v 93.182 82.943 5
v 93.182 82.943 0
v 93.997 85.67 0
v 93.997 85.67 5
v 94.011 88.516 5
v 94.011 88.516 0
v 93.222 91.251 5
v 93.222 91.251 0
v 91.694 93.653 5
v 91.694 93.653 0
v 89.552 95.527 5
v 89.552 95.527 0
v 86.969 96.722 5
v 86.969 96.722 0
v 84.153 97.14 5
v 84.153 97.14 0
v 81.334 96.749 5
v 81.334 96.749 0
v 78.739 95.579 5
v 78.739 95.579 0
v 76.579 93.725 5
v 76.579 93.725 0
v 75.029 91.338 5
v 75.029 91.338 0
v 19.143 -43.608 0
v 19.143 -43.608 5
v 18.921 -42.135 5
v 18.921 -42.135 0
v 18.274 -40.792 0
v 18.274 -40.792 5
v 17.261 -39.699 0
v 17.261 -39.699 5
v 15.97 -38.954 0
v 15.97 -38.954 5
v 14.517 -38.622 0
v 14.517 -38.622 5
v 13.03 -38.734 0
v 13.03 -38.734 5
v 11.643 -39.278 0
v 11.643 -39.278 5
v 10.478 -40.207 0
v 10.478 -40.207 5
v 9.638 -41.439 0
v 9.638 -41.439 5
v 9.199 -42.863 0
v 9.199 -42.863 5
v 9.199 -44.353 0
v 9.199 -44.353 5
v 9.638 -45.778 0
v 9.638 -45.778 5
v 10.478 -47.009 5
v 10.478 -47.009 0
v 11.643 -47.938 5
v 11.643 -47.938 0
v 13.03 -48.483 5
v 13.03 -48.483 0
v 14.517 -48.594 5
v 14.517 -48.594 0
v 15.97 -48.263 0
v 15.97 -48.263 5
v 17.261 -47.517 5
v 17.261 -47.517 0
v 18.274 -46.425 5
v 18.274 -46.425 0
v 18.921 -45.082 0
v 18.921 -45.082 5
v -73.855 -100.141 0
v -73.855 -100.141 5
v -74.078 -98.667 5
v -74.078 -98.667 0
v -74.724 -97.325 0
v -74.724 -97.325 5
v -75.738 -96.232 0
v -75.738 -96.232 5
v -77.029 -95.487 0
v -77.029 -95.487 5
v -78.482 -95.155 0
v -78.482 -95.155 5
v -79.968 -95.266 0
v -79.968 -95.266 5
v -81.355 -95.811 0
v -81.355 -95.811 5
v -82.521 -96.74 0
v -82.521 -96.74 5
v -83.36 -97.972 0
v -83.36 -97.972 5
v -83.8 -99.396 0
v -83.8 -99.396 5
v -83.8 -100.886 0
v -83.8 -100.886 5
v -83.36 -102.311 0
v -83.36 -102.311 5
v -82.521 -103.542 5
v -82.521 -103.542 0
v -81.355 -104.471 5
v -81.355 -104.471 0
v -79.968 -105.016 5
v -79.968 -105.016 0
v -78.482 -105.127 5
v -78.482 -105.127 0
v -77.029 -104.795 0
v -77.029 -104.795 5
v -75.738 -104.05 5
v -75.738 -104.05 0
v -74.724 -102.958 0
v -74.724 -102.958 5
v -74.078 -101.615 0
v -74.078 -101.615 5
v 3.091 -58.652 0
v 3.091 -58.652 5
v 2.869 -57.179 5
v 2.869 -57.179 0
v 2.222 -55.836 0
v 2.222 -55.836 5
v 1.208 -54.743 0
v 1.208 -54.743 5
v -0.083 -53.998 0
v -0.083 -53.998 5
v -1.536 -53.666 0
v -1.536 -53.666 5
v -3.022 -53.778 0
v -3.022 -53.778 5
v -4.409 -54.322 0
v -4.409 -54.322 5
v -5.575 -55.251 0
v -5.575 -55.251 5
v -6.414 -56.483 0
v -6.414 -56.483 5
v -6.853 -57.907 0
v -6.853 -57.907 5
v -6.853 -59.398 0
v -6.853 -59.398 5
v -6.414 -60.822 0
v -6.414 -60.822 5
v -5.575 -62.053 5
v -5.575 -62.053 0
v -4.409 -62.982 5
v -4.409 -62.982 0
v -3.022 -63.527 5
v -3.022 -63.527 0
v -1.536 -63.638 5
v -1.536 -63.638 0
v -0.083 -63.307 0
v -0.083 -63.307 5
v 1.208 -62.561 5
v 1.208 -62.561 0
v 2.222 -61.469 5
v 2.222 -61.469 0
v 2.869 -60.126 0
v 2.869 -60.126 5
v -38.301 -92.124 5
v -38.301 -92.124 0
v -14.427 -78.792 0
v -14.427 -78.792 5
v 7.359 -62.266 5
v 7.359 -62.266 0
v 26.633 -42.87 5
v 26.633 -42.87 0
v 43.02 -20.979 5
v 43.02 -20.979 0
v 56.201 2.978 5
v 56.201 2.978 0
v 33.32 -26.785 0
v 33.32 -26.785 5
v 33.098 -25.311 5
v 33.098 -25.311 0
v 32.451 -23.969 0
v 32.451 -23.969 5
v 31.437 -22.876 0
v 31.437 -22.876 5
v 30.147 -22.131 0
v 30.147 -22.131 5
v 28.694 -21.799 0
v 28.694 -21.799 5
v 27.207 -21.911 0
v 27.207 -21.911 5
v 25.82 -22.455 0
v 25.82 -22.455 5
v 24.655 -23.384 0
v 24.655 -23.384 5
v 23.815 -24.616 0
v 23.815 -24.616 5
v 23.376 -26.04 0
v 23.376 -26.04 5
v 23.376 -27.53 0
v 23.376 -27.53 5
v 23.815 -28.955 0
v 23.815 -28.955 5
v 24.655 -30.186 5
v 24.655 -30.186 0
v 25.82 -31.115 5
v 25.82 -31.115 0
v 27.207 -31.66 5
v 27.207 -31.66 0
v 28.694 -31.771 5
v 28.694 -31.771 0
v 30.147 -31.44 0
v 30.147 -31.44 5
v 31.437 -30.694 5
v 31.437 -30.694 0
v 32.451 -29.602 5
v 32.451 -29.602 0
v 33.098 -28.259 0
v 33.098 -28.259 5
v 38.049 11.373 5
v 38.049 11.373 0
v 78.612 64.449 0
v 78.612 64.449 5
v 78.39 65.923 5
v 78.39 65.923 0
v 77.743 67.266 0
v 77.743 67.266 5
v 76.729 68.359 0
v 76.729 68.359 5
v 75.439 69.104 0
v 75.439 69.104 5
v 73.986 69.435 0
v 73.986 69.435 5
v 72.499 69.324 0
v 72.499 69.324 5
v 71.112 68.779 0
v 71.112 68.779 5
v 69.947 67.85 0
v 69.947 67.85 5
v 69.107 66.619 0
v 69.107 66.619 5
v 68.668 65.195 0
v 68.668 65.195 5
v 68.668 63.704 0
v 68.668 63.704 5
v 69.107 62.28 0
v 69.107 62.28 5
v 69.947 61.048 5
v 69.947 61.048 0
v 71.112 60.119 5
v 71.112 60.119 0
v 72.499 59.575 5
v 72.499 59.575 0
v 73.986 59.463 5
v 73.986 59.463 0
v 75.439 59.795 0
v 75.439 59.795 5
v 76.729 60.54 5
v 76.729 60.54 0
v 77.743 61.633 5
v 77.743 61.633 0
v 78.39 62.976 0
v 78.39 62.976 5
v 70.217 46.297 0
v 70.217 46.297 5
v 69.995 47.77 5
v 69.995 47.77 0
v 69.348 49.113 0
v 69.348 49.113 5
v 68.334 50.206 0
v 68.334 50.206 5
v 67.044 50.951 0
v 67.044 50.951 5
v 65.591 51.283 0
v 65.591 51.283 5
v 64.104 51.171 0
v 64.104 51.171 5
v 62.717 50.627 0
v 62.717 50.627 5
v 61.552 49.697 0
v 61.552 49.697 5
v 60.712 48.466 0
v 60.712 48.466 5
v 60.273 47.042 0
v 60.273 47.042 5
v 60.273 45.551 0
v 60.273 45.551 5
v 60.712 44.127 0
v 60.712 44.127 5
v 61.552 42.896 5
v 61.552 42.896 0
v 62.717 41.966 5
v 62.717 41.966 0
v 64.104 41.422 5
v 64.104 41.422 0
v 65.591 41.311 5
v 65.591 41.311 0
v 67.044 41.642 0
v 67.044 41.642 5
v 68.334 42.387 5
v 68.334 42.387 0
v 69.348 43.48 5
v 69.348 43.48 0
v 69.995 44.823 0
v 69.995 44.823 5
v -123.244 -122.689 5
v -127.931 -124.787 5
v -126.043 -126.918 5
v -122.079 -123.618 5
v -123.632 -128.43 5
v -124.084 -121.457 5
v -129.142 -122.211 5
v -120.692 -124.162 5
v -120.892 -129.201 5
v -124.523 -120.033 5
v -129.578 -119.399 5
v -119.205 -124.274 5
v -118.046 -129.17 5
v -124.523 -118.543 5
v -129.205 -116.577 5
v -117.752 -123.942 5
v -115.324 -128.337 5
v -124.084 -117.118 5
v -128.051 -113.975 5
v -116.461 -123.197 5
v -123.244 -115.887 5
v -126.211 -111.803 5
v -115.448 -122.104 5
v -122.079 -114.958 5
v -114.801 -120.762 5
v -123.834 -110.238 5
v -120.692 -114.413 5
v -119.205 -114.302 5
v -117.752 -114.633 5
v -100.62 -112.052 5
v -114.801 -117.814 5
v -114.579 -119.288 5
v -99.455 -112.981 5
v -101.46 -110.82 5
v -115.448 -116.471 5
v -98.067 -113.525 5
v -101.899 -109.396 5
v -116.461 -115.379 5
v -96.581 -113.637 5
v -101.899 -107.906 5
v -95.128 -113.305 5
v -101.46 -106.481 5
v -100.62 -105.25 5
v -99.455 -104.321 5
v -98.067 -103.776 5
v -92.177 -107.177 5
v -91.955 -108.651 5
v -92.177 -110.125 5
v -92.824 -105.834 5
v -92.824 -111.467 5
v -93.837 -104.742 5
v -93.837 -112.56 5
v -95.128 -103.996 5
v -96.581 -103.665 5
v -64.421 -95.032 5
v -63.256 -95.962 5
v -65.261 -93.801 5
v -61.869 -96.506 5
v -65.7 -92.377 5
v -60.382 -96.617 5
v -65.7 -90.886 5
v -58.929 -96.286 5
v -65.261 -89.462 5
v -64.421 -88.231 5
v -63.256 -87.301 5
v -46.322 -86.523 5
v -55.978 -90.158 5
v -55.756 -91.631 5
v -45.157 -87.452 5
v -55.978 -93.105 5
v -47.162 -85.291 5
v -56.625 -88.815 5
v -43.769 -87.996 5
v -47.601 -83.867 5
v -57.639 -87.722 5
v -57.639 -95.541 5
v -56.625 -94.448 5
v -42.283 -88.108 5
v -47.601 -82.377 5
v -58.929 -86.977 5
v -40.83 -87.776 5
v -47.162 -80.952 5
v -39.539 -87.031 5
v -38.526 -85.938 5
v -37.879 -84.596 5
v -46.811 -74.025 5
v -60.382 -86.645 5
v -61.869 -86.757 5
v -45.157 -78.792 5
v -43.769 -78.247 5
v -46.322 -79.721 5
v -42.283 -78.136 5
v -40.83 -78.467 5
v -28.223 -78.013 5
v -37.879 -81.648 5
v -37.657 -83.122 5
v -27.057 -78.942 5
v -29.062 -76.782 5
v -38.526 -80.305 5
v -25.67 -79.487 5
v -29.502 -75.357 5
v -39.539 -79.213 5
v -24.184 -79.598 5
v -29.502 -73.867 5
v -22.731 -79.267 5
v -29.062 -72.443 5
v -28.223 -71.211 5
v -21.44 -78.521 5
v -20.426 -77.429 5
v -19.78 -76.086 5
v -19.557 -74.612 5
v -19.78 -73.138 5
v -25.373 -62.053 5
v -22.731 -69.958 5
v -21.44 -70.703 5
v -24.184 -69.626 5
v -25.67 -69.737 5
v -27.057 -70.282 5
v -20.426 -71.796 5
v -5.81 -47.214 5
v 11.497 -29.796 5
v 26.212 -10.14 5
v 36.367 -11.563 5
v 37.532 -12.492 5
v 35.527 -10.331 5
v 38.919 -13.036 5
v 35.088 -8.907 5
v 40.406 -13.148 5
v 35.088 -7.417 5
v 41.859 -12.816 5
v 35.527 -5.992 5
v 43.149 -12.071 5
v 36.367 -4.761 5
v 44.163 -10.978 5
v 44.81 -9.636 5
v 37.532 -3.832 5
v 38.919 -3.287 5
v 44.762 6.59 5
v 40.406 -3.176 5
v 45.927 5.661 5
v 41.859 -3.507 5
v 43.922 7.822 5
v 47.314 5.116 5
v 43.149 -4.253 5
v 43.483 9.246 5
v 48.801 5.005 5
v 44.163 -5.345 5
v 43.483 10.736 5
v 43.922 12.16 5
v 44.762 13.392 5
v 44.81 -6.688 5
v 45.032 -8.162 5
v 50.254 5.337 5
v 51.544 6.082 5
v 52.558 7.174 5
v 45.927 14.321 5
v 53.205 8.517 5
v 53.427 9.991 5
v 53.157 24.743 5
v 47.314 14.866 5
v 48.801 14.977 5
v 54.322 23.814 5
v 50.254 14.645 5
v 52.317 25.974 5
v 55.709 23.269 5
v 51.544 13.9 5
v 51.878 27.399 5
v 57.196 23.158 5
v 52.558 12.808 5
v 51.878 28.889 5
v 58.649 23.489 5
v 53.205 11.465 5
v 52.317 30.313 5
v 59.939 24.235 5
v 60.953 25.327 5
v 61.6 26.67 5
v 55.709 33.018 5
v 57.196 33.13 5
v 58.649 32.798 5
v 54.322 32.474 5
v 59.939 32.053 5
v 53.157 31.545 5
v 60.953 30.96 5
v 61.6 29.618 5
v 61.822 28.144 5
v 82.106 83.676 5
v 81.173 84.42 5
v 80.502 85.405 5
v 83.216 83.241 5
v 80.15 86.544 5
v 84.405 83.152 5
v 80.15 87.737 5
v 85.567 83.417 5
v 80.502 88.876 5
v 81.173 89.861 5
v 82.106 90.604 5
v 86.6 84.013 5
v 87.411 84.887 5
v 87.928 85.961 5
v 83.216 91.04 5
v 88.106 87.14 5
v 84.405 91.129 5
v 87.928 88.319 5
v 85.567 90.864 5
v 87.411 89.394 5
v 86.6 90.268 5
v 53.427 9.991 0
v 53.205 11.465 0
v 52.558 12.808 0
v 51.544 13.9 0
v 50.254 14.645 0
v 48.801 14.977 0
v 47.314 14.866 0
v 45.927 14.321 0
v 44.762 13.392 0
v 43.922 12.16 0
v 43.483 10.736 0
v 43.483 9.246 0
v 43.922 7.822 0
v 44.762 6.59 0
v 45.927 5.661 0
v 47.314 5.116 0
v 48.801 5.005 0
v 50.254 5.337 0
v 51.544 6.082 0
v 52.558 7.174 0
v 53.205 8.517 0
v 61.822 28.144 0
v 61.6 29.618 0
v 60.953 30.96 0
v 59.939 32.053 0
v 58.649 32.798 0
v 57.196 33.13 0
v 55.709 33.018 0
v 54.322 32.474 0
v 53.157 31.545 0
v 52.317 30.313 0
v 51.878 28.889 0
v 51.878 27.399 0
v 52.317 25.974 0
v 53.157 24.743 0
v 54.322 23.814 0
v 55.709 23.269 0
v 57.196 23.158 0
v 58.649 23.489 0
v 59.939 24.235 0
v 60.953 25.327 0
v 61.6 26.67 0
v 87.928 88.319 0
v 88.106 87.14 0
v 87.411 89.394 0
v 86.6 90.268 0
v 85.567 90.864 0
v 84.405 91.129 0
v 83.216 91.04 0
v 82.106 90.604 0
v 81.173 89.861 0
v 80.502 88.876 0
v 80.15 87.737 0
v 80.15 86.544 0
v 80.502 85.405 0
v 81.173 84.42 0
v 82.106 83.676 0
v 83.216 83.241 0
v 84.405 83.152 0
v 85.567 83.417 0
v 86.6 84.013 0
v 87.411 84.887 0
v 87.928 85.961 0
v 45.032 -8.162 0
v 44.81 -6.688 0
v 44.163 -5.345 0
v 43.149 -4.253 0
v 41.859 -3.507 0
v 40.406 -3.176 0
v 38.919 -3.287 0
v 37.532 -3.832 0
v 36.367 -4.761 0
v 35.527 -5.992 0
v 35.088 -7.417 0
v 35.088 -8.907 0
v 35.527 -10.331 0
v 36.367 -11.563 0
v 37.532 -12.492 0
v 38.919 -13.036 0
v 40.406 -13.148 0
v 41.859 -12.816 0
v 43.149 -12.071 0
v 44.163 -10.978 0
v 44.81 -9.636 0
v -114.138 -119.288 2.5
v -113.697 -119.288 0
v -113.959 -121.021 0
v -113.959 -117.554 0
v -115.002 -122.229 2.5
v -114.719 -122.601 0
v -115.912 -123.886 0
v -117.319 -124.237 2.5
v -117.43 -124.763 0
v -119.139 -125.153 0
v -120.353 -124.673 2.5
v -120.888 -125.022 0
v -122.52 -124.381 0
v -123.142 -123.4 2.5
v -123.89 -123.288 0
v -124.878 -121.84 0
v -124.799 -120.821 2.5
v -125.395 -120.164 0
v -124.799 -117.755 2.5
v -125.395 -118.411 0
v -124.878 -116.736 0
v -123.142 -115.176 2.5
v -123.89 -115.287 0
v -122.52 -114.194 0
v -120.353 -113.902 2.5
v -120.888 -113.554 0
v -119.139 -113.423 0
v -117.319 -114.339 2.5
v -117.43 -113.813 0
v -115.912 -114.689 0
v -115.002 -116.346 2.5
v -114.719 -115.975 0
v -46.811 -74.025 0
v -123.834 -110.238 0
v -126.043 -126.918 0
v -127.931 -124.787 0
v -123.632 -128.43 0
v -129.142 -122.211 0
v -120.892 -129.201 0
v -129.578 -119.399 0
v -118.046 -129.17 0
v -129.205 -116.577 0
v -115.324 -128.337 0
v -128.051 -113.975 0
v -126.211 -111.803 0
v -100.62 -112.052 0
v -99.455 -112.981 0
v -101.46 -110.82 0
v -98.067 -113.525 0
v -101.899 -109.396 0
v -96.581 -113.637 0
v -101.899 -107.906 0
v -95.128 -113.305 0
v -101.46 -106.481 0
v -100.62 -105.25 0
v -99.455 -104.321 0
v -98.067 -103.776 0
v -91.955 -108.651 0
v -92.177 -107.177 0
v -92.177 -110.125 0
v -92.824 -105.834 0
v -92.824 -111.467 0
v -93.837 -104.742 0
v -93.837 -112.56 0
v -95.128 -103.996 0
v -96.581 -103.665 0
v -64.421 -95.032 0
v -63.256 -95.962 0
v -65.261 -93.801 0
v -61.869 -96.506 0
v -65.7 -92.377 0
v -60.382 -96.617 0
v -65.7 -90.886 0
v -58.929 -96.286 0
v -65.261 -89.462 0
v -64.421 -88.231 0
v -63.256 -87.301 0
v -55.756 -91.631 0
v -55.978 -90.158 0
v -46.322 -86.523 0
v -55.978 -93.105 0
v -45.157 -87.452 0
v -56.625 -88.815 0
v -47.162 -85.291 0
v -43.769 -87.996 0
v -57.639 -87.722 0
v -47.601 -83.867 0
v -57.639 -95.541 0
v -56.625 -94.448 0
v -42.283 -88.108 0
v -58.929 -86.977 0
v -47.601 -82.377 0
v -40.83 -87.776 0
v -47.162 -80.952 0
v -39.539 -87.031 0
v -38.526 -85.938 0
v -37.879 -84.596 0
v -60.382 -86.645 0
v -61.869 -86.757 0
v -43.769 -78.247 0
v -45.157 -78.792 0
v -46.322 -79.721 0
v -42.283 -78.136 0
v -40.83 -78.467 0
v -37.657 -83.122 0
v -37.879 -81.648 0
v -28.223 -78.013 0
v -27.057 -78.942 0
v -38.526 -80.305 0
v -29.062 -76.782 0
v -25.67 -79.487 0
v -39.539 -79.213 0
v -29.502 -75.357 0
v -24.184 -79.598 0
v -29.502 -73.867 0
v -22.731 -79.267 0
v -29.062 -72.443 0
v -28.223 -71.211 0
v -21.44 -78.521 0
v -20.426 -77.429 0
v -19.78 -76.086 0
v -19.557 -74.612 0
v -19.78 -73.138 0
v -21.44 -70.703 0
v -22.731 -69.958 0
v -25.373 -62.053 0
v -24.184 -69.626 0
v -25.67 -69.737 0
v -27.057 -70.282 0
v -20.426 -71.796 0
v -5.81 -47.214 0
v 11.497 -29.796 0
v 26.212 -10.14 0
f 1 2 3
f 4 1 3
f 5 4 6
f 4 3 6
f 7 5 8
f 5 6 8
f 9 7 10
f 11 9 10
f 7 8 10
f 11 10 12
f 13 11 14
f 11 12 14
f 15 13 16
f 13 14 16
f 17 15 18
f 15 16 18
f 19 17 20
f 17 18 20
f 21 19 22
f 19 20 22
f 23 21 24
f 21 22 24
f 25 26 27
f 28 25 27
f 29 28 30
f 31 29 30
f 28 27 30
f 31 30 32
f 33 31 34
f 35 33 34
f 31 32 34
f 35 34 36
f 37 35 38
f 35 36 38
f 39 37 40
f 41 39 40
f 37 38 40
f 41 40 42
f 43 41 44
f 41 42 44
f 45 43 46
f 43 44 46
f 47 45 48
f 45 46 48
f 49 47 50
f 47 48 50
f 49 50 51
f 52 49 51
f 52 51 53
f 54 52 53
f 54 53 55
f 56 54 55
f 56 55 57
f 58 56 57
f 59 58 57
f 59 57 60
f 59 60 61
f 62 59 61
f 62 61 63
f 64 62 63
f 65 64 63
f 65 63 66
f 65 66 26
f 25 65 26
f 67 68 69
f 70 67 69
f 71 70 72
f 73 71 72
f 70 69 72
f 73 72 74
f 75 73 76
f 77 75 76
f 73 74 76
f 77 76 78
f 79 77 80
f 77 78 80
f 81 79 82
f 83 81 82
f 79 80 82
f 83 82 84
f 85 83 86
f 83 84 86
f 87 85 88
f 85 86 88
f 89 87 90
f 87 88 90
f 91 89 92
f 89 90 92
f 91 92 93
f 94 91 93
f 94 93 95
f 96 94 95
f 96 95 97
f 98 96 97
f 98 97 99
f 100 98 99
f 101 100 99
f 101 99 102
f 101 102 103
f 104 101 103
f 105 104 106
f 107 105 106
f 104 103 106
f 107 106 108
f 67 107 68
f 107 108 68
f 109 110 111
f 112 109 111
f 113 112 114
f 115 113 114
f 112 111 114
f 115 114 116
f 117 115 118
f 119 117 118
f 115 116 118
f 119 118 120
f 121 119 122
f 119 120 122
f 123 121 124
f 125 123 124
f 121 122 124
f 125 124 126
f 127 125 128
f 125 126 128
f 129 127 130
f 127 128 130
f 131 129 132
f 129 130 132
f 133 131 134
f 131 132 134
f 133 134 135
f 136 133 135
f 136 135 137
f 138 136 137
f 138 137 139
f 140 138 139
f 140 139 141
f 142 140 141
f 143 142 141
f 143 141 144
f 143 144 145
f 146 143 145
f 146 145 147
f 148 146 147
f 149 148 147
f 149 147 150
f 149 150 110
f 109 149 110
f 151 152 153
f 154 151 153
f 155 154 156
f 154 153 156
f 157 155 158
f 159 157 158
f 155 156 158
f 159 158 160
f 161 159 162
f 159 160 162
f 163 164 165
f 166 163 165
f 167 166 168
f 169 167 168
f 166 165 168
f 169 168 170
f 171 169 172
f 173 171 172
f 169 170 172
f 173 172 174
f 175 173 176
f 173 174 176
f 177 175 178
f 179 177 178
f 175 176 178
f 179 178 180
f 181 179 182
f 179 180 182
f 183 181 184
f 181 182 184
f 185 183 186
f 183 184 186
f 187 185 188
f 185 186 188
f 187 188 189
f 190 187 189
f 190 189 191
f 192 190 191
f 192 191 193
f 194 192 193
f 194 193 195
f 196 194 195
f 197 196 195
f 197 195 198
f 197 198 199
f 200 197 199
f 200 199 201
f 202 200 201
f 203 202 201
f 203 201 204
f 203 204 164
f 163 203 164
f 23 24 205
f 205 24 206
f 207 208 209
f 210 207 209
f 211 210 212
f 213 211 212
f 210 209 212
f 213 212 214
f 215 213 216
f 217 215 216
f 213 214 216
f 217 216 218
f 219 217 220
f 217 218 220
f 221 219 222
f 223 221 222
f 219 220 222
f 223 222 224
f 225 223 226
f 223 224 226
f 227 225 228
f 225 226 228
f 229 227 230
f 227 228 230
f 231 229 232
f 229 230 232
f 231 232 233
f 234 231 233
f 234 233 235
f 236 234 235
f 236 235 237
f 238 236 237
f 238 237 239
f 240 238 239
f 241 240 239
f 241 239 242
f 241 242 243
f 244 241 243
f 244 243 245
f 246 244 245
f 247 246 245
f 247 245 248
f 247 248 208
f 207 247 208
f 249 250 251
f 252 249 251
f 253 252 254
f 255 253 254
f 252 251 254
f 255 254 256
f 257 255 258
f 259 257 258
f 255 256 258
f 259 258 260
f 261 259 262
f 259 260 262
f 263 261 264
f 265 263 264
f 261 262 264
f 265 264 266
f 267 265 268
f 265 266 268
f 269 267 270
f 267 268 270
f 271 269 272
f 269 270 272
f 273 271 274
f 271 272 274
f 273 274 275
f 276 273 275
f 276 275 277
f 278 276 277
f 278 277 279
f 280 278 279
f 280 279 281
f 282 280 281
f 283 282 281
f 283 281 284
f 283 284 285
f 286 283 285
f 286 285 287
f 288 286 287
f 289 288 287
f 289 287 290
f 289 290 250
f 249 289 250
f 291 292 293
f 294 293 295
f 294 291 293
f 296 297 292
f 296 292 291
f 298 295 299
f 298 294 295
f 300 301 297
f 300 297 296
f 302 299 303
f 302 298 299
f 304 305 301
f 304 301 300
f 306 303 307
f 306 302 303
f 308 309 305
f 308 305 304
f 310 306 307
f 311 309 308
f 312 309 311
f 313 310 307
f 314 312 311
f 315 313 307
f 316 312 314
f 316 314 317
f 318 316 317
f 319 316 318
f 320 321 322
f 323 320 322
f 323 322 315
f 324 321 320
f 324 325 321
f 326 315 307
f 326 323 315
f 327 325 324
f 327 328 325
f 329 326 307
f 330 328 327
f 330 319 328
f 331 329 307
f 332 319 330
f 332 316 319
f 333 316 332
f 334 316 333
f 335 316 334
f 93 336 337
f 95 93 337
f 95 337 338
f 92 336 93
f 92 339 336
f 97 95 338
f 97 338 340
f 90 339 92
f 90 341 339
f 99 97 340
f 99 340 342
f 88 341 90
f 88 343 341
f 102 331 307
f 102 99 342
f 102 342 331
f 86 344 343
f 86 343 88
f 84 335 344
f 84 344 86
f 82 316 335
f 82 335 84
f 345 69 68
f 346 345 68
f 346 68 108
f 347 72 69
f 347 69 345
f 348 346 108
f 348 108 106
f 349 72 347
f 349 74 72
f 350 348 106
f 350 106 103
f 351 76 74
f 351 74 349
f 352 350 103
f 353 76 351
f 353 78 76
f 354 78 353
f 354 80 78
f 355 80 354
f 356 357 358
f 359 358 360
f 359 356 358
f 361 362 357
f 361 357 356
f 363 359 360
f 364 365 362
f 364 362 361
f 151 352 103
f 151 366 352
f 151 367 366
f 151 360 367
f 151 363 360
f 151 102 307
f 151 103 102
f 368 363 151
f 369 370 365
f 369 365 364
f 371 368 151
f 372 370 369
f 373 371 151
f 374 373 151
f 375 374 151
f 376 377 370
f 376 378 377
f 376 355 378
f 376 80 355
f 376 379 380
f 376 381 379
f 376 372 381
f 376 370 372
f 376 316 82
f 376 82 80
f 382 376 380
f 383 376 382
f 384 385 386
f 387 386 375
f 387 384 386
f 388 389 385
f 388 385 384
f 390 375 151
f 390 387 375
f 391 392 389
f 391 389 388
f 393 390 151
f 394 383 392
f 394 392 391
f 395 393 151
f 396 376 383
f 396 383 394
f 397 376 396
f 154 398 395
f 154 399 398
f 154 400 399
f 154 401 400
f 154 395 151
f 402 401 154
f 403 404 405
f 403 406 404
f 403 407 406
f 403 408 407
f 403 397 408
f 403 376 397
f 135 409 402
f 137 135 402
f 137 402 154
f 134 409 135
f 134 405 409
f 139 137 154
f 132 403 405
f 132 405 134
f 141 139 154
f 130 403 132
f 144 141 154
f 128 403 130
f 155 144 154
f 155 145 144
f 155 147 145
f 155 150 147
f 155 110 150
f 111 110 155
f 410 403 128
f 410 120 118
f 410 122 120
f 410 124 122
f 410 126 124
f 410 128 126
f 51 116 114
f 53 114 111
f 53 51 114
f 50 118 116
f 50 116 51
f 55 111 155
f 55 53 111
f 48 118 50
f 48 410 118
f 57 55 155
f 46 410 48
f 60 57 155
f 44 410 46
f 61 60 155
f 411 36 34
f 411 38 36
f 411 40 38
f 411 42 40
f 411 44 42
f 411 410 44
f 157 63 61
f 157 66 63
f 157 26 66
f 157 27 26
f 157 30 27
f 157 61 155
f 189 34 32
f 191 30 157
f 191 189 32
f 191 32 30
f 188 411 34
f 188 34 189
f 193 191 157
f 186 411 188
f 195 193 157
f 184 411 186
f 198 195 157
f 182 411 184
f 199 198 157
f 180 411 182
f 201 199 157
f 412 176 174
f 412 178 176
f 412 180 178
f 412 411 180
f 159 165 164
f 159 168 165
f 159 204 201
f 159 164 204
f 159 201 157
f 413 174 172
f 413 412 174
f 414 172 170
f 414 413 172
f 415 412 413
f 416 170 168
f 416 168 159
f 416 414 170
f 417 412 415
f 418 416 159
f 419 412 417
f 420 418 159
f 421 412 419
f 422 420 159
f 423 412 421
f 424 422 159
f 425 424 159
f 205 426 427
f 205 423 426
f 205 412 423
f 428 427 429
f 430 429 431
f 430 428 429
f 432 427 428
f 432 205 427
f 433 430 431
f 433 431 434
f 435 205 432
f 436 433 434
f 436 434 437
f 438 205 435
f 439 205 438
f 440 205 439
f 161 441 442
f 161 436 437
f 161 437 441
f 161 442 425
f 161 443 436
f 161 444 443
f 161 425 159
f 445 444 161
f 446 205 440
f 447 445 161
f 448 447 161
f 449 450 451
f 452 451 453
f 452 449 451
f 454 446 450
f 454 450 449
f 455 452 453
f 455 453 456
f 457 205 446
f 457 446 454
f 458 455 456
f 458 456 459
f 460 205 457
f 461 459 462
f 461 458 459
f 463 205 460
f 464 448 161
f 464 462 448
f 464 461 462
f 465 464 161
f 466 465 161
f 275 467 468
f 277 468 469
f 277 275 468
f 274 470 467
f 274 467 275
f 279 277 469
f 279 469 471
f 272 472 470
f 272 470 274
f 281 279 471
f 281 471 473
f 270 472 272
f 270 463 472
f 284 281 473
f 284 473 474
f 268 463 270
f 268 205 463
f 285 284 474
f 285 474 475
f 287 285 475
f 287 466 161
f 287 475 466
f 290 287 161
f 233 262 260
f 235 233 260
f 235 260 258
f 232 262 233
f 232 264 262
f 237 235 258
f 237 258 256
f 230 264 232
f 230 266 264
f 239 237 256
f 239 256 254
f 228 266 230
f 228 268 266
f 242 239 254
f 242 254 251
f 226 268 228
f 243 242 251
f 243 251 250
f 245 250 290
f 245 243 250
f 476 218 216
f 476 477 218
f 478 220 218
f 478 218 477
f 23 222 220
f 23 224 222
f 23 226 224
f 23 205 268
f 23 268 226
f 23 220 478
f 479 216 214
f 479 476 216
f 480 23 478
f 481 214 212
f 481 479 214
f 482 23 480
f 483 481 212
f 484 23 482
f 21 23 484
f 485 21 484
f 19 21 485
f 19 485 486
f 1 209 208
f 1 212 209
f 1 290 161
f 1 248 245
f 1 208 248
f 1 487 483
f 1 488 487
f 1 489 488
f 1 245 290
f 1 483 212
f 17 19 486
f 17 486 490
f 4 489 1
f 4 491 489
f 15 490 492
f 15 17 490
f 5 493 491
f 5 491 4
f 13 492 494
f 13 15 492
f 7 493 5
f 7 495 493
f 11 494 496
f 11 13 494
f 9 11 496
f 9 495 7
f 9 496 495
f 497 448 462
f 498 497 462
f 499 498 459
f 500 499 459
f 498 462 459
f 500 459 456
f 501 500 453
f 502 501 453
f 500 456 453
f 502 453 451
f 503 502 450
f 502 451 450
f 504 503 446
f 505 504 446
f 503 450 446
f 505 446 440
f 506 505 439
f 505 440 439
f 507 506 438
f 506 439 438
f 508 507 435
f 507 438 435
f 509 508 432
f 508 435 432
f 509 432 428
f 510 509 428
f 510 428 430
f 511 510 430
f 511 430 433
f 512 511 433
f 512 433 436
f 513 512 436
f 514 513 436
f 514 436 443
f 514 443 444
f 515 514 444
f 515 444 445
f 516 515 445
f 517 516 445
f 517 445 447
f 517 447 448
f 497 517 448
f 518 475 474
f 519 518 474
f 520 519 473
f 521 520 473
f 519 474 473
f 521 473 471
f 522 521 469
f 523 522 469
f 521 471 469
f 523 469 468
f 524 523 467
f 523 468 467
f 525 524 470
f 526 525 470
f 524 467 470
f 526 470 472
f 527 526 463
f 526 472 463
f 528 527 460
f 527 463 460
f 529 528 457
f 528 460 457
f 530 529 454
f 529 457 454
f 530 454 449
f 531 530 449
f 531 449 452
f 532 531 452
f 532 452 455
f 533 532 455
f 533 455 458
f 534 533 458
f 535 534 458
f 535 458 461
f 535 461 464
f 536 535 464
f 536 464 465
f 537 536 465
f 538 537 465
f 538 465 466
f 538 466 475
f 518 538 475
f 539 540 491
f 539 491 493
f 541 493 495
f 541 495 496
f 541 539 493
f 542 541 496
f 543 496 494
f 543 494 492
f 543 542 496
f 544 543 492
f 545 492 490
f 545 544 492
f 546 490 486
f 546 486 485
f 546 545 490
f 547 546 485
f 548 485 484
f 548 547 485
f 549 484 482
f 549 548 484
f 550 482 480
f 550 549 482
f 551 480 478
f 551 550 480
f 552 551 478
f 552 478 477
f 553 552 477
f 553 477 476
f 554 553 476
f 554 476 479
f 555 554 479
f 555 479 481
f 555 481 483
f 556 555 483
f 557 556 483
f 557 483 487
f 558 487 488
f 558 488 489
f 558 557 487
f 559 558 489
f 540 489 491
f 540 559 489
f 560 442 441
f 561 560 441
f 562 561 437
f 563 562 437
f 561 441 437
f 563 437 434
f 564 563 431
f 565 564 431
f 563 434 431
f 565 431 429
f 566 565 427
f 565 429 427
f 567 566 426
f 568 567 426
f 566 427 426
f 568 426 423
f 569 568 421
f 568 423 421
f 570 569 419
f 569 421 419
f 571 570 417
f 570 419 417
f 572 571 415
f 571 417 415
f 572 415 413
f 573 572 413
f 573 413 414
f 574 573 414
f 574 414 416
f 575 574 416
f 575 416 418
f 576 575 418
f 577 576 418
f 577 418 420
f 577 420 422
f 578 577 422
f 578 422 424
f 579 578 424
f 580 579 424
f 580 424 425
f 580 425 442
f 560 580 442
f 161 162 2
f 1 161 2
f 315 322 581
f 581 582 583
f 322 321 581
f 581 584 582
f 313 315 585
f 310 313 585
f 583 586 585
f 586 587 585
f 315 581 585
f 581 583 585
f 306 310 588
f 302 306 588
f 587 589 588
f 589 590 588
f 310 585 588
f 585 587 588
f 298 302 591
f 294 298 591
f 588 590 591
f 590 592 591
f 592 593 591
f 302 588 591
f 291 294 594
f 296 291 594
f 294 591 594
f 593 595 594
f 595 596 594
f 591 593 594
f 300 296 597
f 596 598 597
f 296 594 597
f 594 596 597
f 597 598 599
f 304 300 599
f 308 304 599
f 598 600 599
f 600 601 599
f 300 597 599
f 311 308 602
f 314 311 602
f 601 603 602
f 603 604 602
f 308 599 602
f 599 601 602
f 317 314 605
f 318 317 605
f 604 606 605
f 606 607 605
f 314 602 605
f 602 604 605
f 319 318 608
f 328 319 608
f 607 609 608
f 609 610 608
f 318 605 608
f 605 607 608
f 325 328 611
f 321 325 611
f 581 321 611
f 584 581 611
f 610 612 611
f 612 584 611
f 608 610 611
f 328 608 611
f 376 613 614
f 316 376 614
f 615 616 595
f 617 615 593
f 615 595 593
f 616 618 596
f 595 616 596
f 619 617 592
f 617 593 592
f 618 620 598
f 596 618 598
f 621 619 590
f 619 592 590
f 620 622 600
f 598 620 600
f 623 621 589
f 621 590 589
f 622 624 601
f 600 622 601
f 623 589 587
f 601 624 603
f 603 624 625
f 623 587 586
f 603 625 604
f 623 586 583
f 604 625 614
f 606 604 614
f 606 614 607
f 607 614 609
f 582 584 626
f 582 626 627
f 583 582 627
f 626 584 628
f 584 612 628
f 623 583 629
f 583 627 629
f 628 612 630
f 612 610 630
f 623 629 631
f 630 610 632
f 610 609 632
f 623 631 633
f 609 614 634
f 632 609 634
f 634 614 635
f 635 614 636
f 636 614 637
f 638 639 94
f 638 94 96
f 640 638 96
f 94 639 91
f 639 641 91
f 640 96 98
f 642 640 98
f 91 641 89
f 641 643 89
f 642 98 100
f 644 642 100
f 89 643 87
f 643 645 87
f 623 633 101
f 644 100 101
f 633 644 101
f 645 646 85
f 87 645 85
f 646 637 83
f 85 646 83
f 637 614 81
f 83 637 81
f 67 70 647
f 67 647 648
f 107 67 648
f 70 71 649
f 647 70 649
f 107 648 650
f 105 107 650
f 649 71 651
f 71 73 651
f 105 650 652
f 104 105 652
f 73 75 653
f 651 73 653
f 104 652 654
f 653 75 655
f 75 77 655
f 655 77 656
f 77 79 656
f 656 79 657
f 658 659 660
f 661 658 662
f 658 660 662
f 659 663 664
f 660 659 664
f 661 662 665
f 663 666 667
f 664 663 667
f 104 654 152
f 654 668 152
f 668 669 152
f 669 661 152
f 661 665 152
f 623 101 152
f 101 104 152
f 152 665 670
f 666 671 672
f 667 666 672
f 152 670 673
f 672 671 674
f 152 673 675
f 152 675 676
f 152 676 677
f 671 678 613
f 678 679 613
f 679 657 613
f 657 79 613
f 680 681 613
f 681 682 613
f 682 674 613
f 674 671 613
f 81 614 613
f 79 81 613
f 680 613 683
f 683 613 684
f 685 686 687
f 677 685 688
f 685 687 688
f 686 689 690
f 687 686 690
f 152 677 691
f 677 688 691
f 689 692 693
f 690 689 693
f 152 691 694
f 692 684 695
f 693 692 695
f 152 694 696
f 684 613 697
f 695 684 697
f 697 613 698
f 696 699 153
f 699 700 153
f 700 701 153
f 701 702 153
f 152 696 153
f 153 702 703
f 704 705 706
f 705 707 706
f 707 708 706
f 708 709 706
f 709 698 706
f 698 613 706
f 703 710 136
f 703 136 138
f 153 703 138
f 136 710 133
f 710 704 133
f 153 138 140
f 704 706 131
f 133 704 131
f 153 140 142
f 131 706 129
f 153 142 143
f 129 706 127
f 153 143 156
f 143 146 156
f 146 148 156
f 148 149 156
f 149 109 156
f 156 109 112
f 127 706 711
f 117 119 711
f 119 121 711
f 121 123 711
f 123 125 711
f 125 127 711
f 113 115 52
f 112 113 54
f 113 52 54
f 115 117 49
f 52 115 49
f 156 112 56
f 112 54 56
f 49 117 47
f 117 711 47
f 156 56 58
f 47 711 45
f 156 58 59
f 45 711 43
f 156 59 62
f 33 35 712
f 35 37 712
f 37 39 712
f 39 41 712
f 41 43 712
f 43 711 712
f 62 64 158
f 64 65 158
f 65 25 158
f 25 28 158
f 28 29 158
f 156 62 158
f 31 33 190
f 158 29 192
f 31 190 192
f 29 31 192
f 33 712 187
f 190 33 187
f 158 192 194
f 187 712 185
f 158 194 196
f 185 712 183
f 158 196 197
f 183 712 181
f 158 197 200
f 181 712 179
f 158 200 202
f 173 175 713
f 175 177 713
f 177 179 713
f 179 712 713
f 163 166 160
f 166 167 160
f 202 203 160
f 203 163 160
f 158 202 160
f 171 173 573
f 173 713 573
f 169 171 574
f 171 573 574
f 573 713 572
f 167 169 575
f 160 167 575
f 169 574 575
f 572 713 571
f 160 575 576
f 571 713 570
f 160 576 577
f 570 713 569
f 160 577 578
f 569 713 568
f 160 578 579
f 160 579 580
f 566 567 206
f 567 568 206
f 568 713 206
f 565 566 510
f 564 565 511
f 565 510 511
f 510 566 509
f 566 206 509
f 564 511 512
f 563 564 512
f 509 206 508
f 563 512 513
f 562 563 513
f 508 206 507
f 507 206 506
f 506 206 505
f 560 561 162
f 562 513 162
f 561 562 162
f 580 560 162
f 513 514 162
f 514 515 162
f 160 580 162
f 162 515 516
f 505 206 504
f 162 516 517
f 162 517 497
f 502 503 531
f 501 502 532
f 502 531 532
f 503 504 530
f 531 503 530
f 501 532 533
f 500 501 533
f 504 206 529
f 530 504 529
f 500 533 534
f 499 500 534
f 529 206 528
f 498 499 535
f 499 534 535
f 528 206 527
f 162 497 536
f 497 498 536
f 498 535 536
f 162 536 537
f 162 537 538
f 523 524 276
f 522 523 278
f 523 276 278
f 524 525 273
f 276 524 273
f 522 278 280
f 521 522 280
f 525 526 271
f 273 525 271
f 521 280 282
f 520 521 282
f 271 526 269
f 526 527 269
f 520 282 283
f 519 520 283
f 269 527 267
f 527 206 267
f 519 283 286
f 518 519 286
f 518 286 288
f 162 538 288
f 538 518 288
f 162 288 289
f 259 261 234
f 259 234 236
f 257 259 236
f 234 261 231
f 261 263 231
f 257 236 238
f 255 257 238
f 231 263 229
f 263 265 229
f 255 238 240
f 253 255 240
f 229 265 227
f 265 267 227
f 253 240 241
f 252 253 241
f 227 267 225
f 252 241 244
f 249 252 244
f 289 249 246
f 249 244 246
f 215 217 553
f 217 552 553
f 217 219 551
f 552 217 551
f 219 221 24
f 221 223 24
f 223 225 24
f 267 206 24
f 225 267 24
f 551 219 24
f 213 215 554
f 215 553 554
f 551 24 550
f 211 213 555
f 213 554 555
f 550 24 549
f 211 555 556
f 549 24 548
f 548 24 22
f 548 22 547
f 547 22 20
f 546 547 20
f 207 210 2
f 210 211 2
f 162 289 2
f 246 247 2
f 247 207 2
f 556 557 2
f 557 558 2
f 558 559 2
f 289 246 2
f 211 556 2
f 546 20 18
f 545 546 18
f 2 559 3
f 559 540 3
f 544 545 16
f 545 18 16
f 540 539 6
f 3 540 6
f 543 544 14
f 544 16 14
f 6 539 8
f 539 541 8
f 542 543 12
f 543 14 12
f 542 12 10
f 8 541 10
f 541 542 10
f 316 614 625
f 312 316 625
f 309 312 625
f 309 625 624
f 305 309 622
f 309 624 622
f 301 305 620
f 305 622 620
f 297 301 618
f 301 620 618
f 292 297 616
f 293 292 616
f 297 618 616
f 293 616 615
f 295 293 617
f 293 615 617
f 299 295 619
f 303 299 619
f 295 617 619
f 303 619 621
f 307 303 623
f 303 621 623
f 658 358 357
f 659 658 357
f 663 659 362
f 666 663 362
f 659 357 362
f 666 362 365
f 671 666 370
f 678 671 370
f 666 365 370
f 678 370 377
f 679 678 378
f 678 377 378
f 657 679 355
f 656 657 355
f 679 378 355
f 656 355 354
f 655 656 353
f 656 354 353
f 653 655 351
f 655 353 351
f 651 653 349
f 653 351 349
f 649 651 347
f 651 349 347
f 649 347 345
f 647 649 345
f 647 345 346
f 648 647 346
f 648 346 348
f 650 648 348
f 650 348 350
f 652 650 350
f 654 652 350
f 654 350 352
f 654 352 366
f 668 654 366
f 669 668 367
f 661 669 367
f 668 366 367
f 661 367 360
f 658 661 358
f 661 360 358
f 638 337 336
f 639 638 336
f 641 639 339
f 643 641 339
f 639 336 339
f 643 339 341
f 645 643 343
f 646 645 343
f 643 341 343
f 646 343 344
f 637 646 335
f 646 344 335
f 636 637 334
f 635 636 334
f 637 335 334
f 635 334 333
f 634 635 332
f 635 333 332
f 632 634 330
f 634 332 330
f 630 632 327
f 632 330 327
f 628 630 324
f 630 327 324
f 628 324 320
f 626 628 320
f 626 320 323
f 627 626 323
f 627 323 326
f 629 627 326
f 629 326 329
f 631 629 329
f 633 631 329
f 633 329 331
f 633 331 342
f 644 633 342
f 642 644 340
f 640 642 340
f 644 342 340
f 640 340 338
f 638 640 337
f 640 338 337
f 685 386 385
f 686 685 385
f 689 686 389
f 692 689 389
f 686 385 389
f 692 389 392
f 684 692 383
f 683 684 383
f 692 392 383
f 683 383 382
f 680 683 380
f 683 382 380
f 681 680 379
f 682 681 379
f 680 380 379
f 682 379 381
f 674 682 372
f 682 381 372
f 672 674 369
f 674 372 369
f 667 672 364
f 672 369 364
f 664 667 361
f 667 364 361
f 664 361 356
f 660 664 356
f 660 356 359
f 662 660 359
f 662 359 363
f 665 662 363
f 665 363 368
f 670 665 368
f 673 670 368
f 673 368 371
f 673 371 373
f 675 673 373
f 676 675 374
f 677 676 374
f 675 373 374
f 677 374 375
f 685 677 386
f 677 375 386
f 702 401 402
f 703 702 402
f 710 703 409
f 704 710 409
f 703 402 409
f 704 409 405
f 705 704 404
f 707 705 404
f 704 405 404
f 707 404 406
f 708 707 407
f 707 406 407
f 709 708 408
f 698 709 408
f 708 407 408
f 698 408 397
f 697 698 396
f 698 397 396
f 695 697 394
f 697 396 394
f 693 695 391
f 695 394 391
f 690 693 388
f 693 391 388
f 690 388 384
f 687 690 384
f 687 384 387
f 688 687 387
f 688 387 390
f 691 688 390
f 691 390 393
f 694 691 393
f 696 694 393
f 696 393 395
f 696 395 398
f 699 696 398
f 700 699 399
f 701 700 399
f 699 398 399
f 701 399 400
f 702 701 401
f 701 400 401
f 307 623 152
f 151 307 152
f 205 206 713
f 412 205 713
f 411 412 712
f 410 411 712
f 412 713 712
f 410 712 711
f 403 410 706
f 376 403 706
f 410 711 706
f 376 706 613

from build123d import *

# Parameters (mm, degrees)
ESQUISSE1_R             = 4
BASE_EXTRUSION_DEPTH    = 5
ESQUISSE4_R             = 5
ENL_V_MAT_EXTRU_1_DEPTH = 184.114841449
ESQUISSE5_R             = 5
ENL_V_MAT_EXTRU_2_DEPTH = 5
ESQUISSE12_R            = 5
ENL_V_MAT_EXTRU_3_DEPTH = 184.114841449


with BuildPart() as part:
    # Esquisse1 → Base-Extrusion (new body)
    with BuildSketch(Plane.XY):
        with BuildLine():
            Line((75.029222277, 91.337855838), (38.048651763, 11.373375441))
            ThreePointArc((38.048651763, 11.373375441), (3.1478246, -38.807248513), (-46.811009341, -74.02482464))
            Line((-46.811009341, -74.02482464), (-123.833766756, -110.238168816))
            ThreePointArc((-123.833766756, -110.238168816), (-128.628603048, -123.542662227), (-115.324109637, -128.33749852))
            Line((-115.324109637, -128.33749852), (-38.301352222, -92.124154344))
            ThreePointArc((-38.301352222, -92.124154344), (17.334621939, -52.904580929), (56.201452189, 2.978386656))
            Line((56.201452189, 2.978386656), (93.182022703, 82.942867053))
            ThreePointArc((93.182022703, 82.942867053), (88.303116883, 96.216761659), (75.029222277, 91.337855838))
        make_face()
        with Locations((84.10562249, 87.140361446)):
            Circle(ESQUISSE1_R, mode=Mode.SUBTRACT)
    extrude(amount=BASE_EXTRUSION_DEPTH)

    # Esquisse3 → Enlèvement de matière-Révolution2 (revolve, cut)
    with BuildSketch(Plane(origin=(24.28345685, -51.648883823, 0), x_dir=(0.9049664851912627, 0.4254828559185108, 0), z_dir=(0.4254828559185108, -0.9049664851912627, 0)), mode=Mode.PRIVATE) as enl_vement_de_mati_re_r_volution2_sk:
        Polygon((-158.969859548, 5), (-153.969859548, 5), (-153.088224644, 0), (-158.969859548, 0), align=None)
    revolve(enl_vement_de_mati_re_r_volution2_sk.sketch.rotate(Axis((-119.578938197, -119.287833668, 13.424474394), (0, 0, -1)), 25.181230443), axis=Axis((-119.578938197, -119.287833668, 13.424474394), (0, 0, -1)), mode=Mode.SUBTRACT)

    # Esquisse4 → Enlèv. mat.-Extru.1 (cut, through all)
    with BuildSketch(Plane.XY.offset(5)):
        with Locations((73.611886508, 64.449360914)):
            Circle(ESQUISSE4_R)
        with Locations((65.216897723, 46.296560488)):
            Circle(ESQUISSE4_R)
        with Locations((56.821908937, 28.143760062)):
            Circle(ESQUISSE4_R)
        with Locations((48.426920152, 9.990959637)):
            Circle(ESQUISSE4_R)
        with Locations((40.031931366, -8.161840789)):
            Circle(ESQUISSE4_R)
    extrude(amount=-ENL_V_MAT_EXTRU_1_DEPTH, mode=Mode.SUBTRACT)

    # Esquisse5 → Enlèv. mat.-Extru.2 (cut)
    with BuildSketch(Plane.XY.offset(5)):
        with Locations((-96.954776067, -108.65076227)):
            Circle(ESQUISSE5_R)
        with Locations((-78.855446363, -100.141105152)):
            Circle(ESQUISSE5_R)
        with Locations((-60.756116659, -91.631448033)):
            Circle(ESQUISSE5_R)
        with Locations((-42.656786955, -83.121790915)):
            Circle(ESQUISSE5_R)
        with Locations((-24.557457251, -74.612133797)):
            Circle(ESQUISSE5_R)
    extrude(amount=-ENL_V_MAT_EXTRU_2_DEPTH, mode=Mode.SUBTRACT)

    # Esquisse12 → Enlèv. mat.-Extru.3 (cut, through all)
    with BuildSketch(Plane.XY.offset(5)):
        with Locations((-1.909251541, -58.652301466)):
            Circle(ESQUISSE12_R)
        with Locations((14.143088399, -43.608286628)):
            Circle(ESQUISSE12_R)
        with Locations((28.319996864, -26.785229047)):
            Circle(ESQUISSE12_R)
    extrude(amount=-ENL_V_MAT_EXTRU_3_DEPTH, mode=Mode.SUBTRACT)


solid = part.part
